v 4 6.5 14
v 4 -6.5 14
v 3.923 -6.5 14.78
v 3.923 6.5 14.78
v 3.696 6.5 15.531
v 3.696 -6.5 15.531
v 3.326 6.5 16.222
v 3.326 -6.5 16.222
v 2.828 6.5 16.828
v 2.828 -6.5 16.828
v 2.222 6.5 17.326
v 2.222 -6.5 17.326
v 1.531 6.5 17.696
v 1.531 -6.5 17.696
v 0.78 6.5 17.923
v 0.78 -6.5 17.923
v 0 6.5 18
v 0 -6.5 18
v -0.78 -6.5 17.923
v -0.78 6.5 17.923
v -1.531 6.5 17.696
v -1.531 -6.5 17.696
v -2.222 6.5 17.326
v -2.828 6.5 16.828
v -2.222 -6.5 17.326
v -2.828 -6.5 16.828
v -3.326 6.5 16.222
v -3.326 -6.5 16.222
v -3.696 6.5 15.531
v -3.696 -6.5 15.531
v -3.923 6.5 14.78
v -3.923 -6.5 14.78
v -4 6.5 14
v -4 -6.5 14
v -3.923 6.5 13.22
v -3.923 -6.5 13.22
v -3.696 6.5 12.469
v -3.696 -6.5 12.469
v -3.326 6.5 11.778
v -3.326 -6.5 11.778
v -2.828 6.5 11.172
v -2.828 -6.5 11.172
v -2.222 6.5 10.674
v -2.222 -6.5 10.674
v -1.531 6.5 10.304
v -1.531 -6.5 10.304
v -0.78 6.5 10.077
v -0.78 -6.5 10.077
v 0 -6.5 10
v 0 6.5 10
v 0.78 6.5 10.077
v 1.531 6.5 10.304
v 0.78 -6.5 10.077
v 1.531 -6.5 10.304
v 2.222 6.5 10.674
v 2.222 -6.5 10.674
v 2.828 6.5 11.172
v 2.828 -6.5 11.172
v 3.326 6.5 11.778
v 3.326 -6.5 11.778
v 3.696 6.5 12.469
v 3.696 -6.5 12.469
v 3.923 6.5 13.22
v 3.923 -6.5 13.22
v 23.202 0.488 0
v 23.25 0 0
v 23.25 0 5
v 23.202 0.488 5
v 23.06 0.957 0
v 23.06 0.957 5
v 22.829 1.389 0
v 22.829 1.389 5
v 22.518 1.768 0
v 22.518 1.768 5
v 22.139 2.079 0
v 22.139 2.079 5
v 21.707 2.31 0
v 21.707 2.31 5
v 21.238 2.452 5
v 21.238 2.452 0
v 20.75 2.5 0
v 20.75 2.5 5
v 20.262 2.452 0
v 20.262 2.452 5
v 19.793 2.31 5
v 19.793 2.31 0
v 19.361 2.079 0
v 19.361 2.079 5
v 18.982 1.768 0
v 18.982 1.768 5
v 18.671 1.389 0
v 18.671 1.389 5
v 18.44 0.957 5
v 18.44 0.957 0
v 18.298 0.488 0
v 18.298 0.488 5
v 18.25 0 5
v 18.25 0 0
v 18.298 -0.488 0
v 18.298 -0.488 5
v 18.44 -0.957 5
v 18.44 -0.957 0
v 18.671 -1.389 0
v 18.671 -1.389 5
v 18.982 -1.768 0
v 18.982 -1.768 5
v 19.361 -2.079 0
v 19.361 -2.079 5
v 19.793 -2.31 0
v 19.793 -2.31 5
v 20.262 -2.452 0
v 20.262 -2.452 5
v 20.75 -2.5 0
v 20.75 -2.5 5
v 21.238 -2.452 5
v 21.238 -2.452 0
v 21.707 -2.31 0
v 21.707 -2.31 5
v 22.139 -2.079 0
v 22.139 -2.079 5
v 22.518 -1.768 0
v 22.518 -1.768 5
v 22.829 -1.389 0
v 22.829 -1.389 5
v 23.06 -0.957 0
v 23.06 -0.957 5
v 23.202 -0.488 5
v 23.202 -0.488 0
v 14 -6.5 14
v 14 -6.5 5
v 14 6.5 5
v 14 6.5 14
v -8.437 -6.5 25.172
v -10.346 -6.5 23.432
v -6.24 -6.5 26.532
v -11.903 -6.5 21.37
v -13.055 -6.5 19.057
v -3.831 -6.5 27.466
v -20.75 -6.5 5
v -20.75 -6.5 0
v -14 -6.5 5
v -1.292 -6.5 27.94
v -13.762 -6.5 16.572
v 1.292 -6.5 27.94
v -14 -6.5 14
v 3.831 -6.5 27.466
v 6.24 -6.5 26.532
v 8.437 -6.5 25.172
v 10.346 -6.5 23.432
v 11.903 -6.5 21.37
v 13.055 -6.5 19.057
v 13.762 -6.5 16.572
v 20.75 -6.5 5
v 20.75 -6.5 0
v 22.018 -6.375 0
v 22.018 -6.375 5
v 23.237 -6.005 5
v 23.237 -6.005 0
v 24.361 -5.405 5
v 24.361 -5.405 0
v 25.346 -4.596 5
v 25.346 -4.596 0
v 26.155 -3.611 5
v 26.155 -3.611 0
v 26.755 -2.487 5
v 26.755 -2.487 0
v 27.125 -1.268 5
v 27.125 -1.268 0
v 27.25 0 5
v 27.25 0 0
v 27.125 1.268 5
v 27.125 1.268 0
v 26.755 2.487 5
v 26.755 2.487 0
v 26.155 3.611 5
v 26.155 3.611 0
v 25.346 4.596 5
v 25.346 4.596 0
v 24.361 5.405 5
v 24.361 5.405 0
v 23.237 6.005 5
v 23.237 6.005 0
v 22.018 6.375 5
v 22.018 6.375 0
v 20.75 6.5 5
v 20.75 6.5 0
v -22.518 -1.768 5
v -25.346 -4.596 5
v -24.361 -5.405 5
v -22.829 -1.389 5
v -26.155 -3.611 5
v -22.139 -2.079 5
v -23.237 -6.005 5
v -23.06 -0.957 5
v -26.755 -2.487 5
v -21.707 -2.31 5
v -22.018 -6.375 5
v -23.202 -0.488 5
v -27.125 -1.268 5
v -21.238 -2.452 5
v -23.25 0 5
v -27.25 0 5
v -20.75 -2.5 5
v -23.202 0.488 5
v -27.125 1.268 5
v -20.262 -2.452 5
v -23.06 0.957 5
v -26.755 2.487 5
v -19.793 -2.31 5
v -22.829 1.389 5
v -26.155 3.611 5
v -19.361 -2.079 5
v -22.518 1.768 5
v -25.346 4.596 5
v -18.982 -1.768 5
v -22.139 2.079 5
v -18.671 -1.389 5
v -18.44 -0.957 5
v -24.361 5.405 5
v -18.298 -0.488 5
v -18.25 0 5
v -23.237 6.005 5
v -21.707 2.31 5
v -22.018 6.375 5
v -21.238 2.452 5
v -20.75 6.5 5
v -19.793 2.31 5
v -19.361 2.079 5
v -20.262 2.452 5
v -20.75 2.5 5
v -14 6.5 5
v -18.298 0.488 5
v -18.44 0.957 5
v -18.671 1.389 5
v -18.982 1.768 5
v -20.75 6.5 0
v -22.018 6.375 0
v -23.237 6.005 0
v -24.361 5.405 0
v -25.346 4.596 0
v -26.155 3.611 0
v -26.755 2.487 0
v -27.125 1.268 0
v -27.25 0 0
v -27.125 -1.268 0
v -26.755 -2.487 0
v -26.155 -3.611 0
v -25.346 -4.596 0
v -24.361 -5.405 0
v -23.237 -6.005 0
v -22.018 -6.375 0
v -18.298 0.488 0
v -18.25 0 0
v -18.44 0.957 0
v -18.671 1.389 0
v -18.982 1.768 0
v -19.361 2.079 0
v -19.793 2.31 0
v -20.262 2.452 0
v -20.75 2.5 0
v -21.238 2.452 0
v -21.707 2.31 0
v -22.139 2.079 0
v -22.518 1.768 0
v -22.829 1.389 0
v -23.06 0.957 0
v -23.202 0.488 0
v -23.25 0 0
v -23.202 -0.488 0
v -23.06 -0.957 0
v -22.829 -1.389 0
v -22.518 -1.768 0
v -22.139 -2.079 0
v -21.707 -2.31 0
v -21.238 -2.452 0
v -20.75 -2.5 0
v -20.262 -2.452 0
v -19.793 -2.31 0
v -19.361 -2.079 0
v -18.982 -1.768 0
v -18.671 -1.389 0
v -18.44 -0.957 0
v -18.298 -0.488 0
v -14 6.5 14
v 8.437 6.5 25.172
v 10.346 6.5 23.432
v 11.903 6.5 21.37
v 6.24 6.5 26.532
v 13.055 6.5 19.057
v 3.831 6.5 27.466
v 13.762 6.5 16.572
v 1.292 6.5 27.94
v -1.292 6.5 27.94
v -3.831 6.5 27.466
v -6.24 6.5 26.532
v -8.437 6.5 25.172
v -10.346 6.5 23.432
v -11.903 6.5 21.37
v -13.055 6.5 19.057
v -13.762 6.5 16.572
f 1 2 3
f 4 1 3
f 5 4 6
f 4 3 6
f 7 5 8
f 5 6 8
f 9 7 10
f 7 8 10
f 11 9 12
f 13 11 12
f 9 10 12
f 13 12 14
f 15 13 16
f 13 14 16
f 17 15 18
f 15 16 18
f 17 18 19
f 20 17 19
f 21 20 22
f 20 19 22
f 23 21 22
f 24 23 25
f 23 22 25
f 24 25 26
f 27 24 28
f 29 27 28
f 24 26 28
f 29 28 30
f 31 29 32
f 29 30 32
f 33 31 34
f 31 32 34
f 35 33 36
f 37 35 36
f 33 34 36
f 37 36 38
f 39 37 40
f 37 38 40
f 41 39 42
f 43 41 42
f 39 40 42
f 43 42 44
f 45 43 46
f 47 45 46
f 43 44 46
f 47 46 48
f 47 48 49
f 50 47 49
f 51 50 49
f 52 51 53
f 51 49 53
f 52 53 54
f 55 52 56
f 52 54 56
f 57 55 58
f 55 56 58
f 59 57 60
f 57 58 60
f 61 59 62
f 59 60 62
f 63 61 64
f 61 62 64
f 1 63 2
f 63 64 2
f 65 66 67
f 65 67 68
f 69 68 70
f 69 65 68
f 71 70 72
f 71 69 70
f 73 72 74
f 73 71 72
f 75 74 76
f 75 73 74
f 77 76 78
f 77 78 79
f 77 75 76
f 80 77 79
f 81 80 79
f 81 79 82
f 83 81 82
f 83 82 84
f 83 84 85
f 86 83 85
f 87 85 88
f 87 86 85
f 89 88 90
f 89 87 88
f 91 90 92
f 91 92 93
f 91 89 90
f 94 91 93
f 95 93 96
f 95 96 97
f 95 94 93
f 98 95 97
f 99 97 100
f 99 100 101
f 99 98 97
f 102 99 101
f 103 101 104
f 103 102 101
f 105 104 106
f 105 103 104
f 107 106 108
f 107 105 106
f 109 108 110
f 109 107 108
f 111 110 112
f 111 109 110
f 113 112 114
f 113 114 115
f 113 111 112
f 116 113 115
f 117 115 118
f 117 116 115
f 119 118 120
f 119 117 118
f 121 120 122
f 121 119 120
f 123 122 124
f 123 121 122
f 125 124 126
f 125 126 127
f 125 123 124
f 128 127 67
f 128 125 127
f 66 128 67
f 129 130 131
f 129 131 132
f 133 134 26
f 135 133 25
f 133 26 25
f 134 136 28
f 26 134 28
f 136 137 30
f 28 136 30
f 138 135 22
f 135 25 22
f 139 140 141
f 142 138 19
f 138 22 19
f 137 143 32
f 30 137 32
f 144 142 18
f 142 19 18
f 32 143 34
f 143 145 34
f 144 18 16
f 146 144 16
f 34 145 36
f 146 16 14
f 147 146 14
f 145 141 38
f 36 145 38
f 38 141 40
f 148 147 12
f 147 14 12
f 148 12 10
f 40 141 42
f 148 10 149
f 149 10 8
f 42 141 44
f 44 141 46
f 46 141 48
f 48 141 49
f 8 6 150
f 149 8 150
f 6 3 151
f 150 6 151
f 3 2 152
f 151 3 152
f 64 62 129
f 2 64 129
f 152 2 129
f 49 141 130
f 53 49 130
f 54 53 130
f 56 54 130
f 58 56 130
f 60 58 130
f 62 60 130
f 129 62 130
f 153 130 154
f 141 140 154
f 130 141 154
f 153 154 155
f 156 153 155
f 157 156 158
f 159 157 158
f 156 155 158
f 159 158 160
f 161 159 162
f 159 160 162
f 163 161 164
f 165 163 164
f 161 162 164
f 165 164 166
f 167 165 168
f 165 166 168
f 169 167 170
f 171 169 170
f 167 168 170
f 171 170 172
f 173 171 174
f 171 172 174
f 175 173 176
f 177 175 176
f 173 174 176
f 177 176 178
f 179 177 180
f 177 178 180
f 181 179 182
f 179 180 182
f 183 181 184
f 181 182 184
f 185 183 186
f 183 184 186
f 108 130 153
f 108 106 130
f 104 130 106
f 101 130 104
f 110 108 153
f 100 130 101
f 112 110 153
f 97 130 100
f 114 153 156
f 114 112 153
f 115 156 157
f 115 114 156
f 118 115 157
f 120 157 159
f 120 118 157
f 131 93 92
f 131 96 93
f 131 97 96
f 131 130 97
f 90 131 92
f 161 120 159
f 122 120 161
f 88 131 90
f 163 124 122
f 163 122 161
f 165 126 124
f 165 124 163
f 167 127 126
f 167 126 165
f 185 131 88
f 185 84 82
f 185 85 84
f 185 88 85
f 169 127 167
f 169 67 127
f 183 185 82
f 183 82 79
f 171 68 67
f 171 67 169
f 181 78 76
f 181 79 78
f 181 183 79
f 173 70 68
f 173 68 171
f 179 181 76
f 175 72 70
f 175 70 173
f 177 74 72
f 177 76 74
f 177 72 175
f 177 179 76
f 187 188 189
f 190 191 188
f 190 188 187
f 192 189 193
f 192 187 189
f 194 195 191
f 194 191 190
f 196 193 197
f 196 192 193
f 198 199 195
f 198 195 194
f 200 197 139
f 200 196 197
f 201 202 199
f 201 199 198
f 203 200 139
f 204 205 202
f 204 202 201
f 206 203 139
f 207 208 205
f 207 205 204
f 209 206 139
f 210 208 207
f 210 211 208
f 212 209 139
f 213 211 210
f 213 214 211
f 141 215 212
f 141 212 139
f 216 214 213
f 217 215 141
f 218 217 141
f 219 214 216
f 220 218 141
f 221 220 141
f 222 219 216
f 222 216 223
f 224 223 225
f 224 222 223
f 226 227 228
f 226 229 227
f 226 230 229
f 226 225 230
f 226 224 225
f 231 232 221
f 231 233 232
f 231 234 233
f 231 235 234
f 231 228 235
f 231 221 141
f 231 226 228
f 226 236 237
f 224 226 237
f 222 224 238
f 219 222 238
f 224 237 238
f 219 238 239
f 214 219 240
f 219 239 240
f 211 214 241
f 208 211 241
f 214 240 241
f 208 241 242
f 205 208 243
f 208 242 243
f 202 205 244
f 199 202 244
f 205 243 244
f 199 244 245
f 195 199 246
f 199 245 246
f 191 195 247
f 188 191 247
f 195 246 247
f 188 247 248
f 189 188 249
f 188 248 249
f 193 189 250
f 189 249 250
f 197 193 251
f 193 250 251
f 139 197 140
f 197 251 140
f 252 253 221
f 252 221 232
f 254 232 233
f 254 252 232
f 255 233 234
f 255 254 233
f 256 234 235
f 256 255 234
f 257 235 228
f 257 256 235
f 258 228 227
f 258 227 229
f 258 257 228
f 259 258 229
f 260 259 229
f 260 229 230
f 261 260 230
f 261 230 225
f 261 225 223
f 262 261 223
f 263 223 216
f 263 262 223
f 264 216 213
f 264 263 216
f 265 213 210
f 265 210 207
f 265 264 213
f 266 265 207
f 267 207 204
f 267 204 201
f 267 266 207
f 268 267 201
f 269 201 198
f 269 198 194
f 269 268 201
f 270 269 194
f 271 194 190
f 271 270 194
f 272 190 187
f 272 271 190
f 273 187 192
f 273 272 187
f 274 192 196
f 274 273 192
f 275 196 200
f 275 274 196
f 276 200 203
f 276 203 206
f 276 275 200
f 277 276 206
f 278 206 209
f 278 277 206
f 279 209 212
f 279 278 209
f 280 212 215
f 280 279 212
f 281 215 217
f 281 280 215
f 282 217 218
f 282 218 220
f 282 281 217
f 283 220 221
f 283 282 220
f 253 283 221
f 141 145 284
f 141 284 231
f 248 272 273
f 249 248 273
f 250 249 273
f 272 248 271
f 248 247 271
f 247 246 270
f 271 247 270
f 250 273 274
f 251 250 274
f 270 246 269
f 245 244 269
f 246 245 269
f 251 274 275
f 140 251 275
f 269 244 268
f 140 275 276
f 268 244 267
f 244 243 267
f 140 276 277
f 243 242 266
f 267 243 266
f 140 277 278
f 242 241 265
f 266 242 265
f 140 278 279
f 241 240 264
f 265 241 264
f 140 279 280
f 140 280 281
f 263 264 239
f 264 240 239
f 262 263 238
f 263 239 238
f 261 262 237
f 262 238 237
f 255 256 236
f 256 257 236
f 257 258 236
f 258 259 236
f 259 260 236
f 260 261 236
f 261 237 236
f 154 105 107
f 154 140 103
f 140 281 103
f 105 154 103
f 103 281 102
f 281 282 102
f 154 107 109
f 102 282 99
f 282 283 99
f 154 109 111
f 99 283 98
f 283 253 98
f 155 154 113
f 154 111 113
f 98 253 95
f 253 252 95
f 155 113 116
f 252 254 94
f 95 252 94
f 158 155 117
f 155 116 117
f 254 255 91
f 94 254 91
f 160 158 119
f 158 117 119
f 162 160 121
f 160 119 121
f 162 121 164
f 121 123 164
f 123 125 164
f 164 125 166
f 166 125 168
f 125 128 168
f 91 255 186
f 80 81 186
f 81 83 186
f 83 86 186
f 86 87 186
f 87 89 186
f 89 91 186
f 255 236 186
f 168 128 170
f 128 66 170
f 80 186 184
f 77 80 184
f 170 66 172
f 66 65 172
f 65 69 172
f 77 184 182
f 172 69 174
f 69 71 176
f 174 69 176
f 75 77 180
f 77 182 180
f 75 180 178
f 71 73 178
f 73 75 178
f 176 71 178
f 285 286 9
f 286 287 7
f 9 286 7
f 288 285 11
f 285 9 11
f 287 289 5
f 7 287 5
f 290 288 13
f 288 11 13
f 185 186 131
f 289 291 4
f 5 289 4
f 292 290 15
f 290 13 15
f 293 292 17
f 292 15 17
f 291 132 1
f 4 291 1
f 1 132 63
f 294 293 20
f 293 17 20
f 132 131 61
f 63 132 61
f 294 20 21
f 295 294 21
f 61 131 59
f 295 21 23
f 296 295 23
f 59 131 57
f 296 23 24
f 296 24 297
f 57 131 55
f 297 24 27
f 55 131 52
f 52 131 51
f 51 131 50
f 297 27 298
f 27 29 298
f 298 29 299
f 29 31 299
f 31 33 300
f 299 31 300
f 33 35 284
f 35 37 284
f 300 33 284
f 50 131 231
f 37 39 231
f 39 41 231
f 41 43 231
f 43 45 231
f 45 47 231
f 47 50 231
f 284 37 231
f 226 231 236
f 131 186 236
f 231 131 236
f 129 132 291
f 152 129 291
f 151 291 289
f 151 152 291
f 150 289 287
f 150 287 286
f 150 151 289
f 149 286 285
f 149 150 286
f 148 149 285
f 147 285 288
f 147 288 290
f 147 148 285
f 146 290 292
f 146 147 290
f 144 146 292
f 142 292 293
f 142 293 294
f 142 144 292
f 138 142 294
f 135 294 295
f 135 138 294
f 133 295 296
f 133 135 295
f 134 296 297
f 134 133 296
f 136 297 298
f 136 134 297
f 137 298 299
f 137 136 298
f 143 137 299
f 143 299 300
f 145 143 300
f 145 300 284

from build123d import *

# Parameters (mm, degrees)
SKETCH_1_R      = 2.5
EXTRUDE_1_DEPTH = 5
SKETCH_2_R      = 4
EXTRUDE_2_DEPTH = 13


with BuildPart() as part:
    # 草图1 → 凸台-拉伸1 (new body)
    with BuildSketch(Plane.XY):
        with BuildLine():
            Line((-20.75, -6.5), (20.75, -6.5))
            ThreePointArc((20.75, -6.5), (27.25, 0), (20.75, 6.5))
            Line((20.75, 6.5), (-20.75, 6.5))
            ThreePointArc((-20.75, 6.5), (-27.25, 0), (-20.75, -6.5))
        make_face()
        with Locations((-20.75, 0)):
            Circle(SKETCH_1_R, mode=Mode.SUBTRACT)
        with Locations((20.75, 0)):
            Circle(SKETCH_1_R, mode=Mode.SUBTRACT)
    extrude(amount=EXTRUDE_1_DEPTH)

    # 草图2 → 凸台-拉伸2 (add)
    with BuildSketch(Plane.XZ.offset(6.5)):
        with BuildLine():
            Line((-14, 14), (-14, 5))
            Line((-14, 5), (14, 5))
            Line((14, 5), (14, 14))
            ThreePointArc((14, 14), (0, 28), (-14, 14))
        make_face()
        with Locations((0, 14)):
            Circle(SKETCH_2_R, mode=Mode.SUBTRACT)
    extrude(amount=-EXTRUDE_2_DEPTH)


solid = part.part
